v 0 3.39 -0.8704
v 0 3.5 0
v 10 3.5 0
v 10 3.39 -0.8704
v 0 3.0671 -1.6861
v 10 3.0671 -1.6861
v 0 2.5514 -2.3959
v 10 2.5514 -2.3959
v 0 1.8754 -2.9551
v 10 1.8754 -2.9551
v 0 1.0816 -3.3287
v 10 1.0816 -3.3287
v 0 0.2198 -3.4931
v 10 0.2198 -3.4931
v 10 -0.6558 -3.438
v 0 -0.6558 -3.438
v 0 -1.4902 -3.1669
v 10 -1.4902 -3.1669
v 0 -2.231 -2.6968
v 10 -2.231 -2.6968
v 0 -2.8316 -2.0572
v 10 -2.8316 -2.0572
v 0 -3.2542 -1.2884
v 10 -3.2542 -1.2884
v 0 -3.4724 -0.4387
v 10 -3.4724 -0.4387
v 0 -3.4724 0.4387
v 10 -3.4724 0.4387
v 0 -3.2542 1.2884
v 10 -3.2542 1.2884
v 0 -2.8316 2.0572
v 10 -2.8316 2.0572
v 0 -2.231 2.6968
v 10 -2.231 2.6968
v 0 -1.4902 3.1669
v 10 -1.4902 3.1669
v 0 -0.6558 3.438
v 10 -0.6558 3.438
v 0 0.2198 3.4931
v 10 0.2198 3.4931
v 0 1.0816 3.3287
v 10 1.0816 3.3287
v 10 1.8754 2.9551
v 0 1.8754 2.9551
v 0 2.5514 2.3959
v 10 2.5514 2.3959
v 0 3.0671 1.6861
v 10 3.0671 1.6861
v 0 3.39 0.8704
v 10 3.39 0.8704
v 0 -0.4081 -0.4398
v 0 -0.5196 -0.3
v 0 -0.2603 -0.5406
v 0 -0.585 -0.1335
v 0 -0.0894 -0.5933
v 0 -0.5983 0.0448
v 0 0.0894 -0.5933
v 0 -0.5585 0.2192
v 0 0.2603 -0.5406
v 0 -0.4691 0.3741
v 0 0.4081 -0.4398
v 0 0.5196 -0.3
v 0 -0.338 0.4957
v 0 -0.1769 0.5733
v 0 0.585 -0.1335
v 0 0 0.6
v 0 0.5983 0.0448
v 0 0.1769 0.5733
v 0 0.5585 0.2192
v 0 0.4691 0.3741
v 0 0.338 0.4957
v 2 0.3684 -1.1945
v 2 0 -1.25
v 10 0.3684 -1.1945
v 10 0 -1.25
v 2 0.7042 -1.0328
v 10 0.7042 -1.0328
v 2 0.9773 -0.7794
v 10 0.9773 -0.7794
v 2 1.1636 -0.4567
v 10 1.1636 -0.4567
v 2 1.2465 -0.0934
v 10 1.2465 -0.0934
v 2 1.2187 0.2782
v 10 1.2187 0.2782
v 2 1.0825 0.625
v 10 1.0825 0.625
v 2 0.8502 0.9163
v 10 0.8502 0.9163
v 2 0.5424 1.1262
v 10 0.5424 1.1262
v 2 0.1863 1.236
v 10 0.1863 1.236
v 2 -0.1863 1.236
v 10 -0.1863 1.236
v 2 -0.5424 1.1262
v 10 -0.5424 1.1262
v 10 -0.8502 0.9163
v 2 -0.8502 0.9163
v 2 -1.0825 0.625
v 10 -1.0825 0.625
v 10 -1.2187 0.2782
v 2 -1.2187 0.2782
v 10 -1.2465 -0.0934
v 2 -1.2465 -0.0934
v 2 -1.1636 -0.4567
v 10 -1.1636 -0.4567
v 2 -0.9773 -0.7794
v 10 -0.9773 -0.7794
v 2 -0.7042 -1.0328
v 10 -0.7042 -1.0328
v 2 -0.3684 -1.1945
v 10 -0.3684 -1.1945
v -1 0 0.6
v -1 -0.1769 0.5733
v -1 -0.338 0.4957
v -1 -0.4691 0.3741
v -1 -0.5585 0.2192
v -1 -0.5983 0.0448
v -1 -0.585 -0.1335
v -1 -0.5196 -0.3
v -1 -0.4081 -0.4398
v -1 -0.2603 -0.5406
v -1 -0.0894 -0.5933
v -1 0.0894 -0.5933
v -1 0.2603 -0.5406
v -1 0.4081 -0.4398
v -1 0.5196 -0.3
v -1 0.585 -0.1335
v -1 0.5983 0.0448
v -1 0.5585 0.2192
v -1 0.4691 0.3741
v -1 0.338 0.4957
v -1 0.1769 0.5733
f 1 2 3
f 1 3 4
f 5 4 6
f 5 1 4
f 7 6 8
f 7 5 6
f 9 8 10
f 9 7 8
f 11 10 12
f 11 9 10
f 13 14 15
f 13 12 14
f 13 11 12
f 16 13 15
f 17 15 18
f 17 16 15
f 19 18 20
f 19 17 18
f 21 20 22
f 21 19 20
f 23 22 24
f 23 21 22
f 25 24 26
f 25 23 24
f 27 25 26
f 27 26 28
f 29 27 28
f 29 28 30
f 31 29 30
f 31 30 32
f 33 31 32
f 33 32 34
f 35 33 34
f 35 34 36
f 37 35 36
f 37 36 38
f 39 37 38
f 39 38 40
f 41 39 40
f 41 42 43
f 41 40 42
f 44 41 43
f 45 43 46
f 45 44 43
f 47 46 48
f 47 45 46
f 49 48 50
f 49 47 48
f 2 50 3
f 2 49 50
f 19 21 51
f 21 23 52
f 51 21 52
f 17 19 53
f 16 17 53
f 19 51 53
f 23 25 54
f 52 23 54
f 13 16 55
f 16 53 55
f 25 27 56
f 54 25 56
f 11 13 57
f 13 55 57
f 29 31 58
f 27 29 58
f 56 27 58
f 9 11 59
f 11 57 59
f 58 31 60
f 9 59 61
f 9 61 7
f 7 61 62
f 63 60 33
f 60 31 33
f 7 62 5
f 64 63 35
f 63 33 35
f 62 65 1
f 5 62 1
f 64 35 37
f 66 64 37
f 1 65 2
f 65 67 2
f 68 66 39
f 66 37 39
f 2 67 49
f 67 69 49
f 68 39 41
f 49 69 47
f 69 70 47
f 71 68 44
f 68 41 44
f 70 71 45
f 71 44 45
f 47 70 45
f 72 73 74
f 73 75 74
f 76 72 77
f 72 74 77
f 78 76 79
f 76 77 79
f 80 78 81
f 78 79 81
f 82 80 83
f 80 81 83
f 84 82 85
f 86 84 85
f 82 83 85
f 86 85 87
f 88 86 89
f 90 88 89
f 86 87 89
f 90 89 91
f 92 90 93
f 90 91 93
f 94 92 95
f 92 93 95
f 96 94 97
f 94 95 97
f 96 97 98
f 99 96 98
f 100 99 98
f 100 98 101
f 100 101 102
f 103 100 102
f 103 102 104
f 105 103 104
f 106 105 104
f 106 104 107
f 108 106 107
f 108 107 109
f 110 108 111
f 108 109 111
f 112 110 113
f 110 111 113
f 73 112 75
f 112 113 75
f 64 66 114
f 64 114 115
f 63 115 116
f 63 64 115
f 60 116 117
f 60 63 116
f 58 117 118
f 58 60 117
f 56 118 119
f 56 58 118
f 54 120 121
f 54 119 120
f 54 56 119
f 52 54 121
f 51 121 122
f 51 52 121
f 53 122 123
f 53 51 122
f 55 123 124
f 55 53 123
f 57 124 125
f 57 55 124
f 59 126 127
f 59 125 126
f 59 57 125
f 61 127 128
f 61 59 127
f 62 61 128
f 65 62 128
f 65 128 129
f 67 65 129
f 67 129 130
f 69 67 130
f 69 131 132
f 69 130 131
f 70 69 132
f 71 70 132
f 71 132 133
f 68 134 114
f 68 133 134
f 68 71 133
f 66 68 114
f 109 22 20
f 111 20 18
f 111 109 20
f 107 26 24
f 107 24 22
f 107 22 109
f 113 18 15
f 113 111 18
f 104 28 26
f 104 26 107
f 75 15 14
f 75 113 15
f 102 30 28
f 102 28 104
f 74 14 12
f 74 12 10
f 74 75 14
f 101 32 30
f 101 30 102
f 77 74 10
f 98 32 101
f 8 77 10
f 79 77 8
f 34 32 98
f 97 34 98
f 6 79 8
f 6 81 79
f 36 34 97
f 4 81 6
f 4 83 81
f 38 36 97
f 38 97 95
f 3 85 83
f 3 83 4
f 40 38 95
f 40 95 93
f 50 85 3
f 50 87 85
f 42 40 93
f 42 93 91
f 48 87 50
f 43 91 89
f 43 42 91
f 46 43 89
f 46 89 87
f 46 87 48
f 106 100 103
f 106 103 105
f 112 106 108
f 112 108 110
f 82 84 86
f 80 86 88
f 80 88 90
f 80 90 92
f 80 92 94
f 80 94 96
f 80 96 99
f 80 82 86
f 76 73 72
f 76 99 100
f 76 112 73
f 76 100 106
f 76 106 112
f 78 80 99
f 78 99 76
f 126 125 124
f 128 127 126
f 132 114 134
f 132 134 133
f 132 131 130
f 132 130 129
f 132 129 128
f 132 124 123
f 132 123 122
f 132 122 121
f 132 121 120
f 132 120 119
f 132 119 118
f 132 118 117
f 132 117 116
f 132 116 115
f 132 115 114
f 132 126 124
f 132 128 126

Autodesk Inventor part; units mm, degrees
ref_plane "YZ Plane" through (0, 0, 0) normal (1, 0, 0) x (0, 1, 0)
ref_plane "XZ Plane" through (0, 0, 0) normal (0, 1, 0) x (-1, 0, 0)
ref_plane "XY Plane" through (0, 0, 0) normal (0, 0, 1) x (1, 0, 0)
sketch "Эскиз1" plane through (0, 0, 0) normal (1, 0, 0) x (0, 1, 0)
  circle A0 centre (0, 0) radius 3.5
  dimension "d0" = 7
extrude "Выдавливание1" add sketch "Эскиз1" along normal blind 10
sketch "Эскиз2" plane through (0, 0, 0) normal (-1, 0, 0) x (0, 0, 1)
  circle A0 centre (0, 0) radius 0.6
  dimension "d3" = 1.2
extrude "Выдавливание2" add sketch "Эскиз2" along normal blind 1
sketch "Эскиз3" plane through (10, 0, 0) normal (1, 0, 0) x (0, 0, -1)
  circle A0 centre (0, 0) radius 0.6 projected
  circle A1 centre (0, 0) radius 1.25
  dimension "d6" = 2.5
extrude "Выдавливание3" cut sketch "Эскиз3" against normal blind 8 contours A0 | A1
thread "Резьба1" size "M2.5x0.45" class "6H" standard "ANSI Metric M Profile" full length
properties part number "Bush_Phase" material "Медь"
